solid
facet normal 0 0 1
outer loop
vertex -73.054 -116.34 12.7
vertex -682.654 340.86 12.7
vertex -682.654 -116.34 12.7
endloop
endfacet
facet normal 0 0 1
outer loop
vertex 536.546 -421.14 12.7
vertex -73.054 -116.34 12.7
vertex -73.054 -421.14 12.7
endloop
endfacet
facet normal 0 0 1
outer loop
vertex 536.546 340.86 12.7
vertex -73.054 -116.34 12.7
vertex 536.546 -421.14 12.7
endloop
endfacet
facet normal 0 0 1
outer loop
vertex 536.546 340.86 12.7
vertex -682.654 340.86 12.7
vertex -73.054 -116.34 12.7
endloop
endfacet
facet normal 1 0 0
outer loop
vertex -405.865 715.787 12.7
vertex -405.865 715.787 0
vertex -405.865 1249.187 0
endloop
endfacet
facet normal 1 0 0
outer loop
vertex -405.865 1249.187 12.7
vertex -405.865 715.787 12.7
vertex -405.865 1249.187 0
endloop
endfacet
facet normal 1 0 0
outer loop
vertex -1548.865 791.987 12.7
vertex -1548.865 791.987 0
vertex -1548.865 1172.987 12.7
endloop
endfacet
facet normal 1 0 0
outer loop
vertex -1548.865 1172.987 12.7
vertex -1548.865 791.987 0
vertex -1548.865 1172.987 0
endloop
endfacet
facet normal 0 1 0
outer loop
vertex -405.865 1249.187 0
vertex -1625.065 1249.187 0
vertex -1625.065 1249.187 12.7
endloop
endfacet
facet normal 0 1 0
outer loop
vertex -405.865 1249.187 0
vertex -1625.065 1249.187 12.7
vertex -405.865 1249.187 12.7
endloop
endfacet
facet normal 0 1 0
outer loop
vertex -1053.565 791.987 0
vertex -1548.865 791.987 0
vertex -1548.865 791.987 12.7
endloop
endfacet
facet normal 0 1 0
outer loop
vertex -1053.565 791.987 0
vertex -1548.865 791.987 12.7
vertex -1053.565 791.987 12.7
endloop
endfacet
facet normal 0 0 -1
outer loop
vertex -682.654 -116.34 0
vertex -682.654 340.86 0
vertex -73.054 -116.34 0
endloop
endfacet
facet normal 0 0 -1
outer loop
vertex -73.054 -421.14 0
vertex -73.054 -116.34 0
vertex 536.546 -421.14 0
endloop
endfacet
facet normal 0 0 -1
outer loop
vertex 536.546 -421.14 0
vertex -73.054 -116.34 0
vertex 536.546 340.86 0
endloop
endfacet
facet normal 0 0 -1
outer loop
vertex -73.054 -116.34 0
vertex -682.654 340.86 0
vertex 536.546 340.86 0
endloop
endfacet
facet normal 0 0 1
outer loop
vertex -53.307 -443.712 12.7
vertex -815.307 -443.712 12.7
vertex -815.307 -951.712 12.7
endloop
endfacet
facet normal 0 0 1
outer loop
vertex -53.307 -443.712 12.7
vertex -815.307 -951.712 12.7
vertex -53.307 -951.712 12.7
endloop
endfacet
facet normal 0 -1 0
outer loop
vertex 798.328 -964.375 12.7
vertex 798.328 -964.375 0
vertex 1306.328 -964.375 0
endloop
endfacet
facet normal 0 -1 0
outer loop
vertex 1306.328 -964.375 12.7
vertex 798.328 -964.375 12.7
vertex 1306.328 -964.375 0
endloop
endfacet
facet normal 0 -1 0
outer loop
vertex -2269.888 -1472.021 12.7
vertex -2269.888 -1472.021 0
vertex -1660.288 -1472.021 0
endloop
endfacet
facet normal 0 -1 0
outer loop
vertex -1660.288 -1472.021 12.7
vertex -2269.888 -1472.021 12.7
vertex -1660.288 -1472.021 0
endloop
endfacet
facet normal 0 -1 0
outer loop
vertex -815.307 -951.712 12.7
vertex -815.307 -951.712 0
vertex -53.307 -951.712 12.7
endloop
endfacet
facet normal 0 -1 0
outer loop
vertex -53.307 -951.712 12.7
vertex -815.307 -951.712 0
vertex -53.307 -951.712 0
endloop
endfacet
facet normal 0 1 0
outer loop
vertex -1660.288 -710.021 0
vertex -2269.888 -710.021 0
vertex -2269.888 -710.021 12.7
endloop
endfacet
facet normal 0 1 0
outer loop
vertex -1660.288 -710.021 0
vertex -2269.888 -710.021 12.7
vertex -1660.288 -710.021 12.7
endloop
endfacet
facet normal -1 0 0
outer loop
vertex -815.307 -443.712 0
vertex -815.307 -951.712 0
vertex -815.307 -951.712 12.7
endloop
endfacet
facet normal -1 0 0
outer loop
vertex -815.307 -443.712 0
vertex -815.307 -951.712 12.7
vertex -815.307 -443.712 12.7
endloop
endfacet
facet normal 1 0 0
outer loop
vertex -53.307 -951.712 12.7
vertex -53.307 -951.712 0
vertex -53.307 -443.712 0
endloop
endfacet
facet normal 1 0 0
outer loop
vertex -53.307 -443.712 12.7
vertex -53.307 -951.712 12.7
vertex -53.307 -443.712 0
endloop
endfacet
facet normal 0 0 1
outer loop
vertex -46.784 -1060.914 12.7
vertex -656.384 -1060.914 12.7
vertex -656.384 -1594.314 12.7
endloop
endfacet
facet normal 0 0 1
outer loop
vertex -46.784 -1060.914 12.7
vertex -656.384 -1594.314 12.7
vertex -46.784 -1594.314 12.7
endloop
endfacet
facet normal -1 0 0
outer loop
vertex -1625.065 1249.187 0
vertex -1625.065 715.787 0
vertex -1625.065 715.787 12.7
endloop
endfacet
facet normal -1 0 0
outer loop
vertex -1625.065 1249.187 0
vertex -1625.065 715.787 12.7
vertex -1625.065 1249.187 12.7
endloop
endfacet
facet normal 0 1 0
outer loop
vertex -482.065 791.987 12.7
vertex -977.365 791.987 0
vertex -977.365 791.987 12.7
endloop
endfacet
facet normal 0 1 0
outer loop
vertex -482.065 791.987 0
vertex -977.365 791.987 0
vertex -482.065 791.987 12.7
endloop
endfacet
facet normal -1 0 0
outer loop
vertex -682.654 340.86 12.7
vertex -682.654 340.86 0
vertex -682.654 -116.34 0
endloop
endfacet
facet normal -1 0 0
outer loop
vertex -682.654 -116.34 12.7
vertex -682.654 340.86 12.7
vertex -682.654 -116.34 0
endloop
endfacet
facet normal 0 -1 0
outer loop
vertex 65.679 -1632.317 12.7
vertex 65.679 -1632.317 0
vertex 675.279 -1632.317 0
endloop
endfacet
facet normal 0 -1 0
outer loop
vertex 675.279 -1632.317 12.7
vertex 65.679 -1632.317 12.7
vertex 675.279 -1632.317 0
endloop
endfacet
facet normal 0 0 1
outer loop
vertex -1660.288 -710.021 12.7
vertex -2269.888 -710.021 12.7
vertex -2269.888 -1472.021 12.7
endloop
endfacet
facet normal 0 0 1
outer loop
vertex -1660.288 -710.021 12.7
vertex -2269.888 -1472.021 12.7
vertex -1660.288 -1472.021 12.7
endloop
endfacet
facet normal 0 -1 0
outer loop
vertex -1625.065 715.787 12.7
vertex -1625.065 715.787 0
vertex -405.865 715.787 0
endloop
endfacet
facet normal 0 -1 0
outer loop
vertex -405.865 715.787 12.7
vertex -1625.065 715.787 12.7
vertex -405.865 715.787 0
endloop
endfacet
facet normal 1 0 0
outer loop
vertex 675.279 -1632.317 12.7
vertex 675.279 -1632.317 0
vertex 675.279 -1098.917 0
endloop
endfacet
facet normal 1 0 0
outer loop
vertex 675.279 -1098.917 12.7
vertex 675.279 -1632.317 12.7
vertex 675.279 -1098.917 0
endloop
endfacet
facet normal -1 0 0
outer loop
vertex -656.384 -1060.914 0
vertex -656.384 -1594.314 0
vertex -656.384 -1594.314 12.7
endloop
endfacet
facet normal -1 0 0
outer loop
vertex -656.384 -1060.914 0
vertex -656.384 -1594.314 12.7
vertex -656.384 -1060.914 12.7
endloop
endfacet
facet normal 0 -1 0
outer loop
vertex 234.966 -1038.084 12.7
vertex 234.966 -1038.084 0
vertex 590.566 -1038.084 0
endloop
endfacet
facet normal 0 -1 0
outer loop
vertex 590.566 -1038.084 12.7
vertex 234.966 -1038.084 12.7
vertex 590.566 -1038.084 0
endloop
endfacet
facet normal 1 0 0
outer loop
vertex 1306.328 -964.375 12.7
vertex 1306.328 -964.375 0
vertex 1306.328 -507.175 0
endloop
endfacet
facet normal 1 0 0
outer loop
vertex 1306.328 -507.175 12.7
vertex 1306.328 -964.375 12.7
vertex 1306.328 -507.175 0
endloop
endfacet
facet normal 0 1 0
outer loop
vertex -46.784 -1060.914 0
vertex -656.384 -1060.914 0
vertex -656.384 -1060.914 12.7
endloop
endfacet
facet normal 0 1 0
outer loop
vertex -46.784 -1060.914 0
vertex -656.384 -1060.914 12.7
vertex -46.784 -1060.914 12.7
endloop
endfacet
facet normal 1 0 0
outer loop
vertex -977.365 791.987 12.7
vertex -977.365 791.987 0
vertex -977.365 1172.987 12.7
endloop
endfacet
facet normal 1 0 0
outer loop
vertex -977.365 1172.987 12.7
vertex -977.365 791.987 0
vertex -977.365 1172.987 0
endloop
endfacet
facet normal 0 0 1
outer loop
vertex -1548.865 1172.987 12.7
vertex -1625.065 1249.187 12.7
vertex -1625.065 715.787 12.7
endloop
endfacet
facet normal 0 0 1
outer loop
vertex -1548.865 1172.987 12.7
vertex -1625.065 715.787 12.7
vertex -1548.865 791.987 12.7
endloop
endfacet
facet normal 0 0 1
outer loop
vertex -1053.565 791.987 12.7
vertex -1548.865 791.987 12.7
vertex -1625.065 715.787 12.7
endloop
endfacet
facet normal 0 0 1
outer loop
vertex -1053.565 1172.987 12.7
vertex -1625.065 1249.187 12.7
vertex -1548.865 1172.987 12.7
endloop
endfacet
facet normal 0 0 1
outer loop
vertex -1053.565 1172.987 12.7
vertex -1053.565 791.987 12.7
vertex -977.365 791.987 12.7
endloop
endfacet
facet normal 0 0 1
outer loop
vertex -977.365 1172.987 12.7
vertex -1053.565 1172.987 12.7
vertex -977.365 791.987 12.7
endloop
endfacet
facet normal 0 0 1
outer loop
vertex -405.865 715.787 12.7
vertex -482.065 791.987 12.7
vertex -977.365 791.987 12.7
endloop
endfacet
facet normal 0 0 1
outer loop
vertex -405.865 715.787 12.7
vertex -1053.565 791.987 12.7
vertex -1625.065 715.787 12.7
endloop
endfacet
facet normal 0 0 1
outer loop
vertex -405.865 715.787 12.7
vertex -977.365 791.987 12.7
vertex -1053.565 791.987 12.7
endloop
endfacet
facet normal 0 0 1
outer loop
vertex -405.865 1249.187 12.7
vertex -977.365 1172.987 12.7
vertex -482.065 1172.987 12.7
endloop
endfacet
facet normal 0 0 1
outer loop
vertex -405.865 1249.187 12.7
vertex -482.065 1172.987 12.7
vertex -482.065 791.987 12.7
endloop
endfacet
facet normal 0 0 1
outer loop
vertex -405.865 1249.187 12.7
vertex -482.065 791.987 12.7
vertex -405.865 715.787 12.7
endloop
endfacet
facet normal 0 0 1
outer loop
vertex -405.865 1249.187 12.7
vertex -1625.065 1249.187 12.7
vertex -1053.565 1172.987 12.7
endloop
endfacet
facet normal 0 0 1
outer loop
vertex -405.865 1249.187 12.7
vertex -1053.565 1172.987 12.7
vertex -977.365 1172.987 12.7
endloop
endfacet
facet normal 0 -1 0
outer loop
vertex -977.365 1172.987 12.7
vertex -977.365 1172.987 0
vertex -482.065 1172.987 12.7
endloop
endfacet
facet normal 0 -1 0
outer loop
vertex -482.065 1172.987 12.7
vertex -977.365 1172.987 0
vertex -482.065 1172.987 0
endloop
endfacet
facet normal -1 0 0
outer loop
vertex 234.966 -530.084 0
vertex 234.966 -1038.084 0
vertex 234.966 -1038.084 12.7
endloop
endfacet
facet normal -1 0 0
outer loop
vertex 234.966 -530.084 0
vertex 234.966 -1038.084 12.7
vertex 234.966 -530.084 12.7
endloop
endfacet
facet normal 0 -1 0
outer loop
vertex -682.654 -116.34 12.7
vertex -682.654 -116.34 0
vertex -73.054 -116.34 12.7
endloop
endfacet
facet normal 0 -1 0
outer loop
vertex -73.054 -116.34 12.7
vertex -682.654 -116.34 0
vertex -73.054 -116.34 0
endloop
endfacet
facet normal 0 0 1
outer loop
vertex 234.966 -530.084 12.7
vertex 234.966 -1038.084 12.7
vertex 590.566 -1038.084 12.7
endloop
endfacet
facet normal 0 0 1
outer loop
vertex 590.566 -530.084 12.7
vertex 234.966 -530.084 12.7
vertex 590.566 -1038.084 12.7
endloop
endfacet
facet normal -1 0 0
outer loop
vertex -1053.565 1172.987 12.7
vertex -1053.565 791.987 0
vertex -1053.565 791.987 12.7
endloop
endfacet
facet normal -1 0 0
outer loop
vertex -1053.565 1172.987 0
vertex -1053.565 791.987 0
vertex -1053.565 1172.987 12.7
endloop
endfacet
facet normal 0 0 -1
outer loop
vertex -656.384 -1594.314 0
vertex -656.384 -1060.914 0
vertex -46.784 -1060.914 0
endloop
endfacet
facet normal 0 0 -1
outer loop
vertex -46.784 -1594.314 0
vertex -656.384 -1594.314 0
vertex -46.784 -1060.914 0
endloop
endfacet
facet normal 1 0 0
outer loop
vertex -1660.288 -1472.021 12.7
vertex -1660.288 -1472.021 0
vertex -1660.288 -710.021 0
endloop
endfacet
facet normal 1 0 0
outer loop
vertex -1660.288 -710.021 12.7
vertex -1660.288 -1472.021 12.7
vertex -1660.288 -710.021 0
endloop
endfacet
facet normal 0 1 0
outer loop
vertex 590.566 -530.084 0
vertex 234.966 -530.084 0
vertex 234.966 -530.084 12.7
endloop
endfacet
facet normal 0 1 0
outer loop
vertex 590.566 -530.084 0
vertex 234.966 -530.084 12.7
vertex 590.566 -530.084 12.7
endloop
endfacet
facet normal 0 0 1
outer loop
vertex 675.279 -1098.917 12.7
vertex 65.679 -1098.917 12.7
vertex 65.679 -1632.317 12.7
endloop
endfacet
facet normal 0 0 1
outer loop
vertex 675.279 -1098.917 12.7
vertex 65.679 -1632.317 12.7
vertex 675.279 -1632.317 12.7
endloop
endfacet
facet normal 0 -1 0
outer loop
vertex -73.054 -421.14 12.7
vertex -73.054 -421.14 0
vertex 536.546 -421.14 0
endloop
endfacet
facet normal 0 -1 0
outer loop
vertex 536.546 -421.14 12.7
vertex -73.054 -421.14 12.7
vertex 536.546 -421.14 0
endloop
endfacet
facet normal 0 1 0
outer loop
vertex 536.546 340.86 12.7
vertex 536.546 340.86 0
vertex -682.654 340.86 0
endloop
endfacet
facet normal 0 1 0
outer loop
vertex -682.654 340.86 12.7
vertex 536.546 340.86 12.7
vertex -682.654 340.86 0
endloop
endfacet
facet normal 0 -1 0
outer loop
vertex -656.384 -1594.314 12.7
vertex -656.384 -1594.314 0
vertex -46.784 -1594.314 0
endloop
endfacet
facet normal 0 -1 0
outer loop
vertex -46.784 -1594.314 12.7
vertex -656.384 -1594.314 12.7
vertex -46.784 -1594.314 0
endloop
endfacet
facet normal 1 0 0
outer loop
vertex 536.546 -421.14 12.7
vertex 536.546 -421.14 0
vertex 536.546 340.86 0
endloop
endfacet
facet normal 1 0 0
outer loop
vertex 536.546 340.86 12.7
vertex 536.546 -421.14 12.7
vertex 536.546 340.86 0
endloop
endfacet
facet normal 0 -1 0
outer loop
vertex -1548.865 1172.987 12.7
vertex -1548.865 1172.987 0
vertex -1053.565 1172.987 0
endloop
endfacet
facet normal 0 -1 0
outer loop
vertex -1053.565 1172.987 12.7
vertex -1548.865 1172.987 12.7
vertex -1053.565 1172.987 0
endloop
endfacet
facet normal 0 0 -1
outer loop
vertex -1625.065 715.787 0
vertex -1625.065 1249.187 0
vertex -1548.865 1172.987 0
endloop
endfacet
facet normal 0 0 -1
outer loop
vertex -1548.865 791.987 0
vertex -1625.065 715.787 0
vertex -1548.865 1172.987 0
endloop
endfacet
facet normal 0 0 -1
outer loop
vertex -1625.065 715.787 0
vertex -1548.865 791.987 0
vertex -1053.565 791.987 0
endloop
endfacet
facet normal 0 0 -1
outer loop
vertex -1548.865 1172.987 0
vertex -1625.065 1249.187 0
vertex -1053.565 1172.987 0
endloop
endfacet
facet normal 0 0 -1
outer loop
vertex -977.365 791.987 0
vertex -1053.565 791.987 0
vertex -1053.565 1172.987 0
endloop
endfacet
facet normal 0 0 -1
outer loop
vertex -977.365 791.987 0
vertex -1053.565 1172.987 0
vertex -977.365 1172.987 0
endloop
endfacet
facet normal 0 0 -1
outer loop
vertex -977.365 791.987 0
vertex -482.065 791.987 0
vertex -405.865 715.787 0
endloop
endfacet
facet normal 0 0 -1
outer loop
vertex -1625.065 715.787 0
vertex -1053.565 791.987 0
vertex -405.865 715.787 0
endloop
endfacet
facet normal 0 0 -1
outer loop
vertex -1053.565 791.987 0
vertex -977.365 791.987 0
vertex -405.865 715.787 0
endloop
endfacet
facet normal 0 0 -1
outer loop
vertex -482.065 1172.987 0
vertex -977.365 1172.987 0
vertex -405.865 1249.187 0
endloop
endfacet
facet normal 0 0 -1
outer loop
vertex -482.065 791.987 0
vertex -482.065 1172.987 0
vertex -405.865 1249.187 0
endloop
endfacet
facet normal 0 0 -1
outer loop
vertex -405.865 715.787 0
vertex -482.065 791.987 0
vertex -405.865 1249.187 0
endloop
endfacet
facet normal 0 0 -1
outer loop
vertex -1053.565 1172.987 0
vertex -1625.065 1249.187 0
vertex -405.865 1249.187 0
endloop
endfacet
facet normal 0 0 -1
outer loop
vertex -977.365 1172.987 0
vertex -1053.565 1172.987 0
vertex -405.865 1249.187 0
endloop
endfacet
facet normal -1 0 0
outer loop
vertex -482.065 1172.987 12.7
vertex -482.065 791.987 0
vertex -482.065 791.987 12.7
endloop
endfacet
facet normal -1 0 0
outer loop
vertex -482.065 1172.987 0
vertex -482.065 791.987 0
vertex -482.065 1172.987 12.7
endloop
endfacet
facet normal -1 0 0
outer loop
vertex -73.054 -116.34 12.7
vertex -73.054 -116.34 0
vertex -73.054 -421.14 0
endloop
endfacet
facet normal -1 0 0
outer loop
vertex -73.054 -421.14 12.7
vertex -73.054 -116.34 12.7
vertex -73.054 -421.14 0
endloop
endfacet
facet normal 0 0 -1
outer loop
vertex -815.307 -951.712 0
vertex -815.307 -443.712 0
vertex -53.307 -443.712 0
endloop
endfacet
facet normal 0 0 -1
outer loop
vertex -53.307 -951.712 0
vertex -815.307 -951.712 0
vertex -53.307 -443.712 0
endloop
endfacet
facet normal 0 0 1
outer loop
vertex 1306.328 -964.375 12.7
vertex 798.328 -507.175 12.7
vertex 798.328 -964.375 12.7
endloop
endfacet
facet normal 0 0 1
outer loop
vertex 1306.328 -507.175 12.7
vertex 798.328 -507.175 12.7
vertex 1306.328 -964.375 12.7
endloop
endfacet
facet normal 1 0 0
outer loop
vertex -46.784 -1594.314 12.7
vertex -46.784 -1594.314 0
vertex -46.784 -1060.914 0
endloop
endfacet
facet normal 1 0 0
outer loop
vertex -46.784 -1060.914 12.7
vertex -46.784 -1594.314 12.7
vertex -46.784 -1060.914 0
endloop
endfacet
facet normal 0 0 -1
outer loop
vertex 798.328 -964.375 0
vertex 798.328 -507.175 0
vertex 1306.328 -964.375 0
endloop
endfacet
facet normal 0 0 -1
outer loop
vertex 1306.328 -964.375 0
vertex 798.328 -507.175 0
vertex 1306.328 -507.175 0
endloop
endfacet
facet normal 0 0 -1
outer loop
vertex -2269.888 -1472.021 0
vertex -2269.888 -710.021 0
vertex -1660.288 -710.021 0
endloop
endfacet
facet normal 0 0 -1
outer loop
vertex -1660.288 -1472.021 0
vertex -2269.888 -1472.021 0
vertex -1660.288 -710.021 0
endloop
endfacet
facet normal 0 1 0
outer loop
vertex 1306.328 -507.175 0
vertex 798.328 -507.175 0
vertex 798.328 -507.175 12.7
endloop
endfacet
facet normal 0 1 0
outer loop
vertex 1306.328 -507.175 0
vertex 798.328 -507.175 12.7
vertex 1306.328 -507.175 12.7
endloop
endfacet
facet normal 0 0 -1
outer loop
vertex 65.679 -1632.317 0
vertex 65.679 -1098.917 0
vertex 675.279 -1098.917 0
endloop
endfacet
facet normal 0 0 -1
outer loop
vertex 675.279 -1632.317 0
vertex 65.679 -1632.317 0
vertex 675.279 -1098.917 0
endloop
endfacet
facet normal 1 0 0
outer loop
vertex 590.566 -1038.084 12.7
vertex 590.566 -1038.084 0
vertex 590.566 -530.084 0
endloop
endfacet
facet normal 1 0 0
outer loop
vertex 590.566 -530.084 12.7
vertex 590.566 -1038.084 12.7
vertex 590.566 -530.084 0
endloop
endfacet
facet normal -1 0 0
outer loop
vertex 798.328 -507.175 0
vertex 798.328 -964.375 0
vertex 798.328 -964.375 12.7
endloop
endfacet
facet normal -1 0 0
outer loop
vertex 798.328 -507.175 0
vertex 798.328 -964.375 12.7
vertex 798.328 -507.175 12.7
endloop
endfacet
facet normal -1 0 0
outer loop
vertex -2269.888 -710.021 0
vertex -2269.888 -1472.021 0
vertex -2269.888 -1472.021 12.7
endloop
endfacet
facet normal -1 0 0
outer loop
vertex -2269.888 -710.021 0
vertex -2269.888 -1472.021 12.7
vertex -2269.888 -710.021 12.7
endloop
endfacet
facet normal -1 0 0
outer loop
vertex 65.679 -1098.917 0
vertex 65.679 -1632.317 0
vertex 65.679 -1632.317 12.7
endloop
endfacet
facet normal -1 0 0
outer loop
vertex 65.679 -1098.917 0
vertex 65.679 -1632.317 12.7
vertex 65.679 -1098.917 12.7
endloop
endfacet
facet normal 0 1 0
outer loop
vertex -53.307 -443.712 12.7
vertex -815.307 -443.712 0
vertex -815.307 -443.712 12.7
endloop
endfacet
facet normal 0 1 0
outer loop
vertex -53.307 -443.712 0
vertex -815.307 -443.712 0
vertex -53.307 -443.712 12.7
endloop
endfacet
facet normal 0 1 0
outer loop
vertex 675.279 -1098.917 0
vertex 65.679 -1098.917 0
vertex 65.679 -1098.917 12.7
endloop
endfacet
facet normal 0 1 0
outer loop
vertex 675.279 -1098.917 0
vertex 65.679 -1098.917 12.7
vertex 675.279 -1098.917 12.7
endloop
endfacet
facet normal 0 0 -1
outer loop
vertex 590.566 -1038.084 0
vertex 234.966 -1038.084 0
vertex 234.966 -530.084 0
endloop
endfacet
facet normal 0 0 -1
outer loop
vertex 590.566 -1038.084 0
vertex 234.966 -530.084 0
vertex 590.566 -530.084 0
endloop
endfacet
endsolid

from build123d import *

# Parameters (mm, degrees)
F1_DEPTH = 12.7
F0_W     = 762
F0_H     = 508
F0_W_2   = 609.6
F0_H_2   = 533.4
F0_W_3   = 355.6
F0_W_4   = 508
F0_H_3   = 457.2
F0_H_4   = 762
F0_W_5   = 1219.2
F0_W_6   = 495.3
F0_H_5   = 381


# Not quite as in the source:
# - a feature names something its author has since deleted; it is built from what else it names


with BuildPart() as f1:
    # F0 (on Top) → F1 (new body)
    with BuildSketch(Plane.XY):
        Polygon((536.5461329095, 340.8599793494), (-682.6538670905, 340.8599793494), (-682.6538670905, -116.3400206506), (-73.0538670905, -116.3400206506), (-73.0538670905, -421.1400206506), (536.5461329095, -421.1400206506), align=None)
    extrude(amount=F1_DEPTH)


with BuildPart() as f1b:
    # F0 (on Top) → F1, piece 2 (new body)
    with BuildSketch(Plane.XY):
        with Locations((-434.3071403503, -697.7123699188)):
            Rectangle(F0_W, F0_H)
    extrude(amount=F1_DEPTH)


with BuildPart() as f1c:
    # F0 (on Top) → F1, piece 3 (new body)
    with BuildSketch(Plane.XY):
        with Locations((-351.5841700554, -1327.6137407303)):
            Rectangle(F0_W_2, F0_H_2)
    extrude(amount=F1_DEPTH)


with BuildPart() as f1d:
    # F0 (on Top) → F1, piece 4 (new body)
    with BuildSketch(Plane.XY):
        with Locations((370.4786859035, -1365.6170661926)):
            Rectangle(F0_W_2, F0_H_2)
    extrude(amount=F1_DEPTH)


with BuildPart() as f1e:
    # F0 (on Top) → F1, piece 5 (new body)
    with BuildSketch(Plane.XY):
        with Locations((412.7661439657, -784.0835533142)):
            Rectangle(F0_W_3, F0_H)
    extrude(amount=F1_DEPTH)


with BuildPart() as f1f:
    # F0 (on Top) → F1, piece 6 (new body)
    with BuildSketch(Plane.XY):
        with Locations((1052.3282208443, -735.7748402596)):
            Rectangle(F0_W_4, F0_H_3)
    extrude(amount=F1_DEPTH)


with BuildPart() as f1g:
    # F0 (on Top) → F1, piece 7 (new body)
    with BuildSketch(Plane.XY):
        with Locations((-1965.0879241943, -1091.020983696)):
            Rectangle(F0_W_2, F0_H_4)
    extrude(amount=F1_DEPTH)


with BuildPart() as f1h:
    # F0 (on Top) → F1, piece 8 (new body)
    with BuildSketch(Plane.XY):
        with Locations((-1015.4649690628, 982.4869935036)):
            Rectangle(F0_W_5, F0_H_2)
        with Locations((-1301.2149690628, 982.4869935036)):
            Rectangle(F0_W_6, F0_H_5, mode=Mode.SUBTRACT)
        with Locations((-729.7149690628, 982.4869935036)):
            Rectangle(F0_W_6, F0_H_5, mode=Mode.SUBTRACT)
    extrude(amount=F1_DEPTH)


solid = Compound([f1.part, f1b.part, f1c.part, f1d.part, f1e.part, f1f.part, f1g.part, f1h.part])
